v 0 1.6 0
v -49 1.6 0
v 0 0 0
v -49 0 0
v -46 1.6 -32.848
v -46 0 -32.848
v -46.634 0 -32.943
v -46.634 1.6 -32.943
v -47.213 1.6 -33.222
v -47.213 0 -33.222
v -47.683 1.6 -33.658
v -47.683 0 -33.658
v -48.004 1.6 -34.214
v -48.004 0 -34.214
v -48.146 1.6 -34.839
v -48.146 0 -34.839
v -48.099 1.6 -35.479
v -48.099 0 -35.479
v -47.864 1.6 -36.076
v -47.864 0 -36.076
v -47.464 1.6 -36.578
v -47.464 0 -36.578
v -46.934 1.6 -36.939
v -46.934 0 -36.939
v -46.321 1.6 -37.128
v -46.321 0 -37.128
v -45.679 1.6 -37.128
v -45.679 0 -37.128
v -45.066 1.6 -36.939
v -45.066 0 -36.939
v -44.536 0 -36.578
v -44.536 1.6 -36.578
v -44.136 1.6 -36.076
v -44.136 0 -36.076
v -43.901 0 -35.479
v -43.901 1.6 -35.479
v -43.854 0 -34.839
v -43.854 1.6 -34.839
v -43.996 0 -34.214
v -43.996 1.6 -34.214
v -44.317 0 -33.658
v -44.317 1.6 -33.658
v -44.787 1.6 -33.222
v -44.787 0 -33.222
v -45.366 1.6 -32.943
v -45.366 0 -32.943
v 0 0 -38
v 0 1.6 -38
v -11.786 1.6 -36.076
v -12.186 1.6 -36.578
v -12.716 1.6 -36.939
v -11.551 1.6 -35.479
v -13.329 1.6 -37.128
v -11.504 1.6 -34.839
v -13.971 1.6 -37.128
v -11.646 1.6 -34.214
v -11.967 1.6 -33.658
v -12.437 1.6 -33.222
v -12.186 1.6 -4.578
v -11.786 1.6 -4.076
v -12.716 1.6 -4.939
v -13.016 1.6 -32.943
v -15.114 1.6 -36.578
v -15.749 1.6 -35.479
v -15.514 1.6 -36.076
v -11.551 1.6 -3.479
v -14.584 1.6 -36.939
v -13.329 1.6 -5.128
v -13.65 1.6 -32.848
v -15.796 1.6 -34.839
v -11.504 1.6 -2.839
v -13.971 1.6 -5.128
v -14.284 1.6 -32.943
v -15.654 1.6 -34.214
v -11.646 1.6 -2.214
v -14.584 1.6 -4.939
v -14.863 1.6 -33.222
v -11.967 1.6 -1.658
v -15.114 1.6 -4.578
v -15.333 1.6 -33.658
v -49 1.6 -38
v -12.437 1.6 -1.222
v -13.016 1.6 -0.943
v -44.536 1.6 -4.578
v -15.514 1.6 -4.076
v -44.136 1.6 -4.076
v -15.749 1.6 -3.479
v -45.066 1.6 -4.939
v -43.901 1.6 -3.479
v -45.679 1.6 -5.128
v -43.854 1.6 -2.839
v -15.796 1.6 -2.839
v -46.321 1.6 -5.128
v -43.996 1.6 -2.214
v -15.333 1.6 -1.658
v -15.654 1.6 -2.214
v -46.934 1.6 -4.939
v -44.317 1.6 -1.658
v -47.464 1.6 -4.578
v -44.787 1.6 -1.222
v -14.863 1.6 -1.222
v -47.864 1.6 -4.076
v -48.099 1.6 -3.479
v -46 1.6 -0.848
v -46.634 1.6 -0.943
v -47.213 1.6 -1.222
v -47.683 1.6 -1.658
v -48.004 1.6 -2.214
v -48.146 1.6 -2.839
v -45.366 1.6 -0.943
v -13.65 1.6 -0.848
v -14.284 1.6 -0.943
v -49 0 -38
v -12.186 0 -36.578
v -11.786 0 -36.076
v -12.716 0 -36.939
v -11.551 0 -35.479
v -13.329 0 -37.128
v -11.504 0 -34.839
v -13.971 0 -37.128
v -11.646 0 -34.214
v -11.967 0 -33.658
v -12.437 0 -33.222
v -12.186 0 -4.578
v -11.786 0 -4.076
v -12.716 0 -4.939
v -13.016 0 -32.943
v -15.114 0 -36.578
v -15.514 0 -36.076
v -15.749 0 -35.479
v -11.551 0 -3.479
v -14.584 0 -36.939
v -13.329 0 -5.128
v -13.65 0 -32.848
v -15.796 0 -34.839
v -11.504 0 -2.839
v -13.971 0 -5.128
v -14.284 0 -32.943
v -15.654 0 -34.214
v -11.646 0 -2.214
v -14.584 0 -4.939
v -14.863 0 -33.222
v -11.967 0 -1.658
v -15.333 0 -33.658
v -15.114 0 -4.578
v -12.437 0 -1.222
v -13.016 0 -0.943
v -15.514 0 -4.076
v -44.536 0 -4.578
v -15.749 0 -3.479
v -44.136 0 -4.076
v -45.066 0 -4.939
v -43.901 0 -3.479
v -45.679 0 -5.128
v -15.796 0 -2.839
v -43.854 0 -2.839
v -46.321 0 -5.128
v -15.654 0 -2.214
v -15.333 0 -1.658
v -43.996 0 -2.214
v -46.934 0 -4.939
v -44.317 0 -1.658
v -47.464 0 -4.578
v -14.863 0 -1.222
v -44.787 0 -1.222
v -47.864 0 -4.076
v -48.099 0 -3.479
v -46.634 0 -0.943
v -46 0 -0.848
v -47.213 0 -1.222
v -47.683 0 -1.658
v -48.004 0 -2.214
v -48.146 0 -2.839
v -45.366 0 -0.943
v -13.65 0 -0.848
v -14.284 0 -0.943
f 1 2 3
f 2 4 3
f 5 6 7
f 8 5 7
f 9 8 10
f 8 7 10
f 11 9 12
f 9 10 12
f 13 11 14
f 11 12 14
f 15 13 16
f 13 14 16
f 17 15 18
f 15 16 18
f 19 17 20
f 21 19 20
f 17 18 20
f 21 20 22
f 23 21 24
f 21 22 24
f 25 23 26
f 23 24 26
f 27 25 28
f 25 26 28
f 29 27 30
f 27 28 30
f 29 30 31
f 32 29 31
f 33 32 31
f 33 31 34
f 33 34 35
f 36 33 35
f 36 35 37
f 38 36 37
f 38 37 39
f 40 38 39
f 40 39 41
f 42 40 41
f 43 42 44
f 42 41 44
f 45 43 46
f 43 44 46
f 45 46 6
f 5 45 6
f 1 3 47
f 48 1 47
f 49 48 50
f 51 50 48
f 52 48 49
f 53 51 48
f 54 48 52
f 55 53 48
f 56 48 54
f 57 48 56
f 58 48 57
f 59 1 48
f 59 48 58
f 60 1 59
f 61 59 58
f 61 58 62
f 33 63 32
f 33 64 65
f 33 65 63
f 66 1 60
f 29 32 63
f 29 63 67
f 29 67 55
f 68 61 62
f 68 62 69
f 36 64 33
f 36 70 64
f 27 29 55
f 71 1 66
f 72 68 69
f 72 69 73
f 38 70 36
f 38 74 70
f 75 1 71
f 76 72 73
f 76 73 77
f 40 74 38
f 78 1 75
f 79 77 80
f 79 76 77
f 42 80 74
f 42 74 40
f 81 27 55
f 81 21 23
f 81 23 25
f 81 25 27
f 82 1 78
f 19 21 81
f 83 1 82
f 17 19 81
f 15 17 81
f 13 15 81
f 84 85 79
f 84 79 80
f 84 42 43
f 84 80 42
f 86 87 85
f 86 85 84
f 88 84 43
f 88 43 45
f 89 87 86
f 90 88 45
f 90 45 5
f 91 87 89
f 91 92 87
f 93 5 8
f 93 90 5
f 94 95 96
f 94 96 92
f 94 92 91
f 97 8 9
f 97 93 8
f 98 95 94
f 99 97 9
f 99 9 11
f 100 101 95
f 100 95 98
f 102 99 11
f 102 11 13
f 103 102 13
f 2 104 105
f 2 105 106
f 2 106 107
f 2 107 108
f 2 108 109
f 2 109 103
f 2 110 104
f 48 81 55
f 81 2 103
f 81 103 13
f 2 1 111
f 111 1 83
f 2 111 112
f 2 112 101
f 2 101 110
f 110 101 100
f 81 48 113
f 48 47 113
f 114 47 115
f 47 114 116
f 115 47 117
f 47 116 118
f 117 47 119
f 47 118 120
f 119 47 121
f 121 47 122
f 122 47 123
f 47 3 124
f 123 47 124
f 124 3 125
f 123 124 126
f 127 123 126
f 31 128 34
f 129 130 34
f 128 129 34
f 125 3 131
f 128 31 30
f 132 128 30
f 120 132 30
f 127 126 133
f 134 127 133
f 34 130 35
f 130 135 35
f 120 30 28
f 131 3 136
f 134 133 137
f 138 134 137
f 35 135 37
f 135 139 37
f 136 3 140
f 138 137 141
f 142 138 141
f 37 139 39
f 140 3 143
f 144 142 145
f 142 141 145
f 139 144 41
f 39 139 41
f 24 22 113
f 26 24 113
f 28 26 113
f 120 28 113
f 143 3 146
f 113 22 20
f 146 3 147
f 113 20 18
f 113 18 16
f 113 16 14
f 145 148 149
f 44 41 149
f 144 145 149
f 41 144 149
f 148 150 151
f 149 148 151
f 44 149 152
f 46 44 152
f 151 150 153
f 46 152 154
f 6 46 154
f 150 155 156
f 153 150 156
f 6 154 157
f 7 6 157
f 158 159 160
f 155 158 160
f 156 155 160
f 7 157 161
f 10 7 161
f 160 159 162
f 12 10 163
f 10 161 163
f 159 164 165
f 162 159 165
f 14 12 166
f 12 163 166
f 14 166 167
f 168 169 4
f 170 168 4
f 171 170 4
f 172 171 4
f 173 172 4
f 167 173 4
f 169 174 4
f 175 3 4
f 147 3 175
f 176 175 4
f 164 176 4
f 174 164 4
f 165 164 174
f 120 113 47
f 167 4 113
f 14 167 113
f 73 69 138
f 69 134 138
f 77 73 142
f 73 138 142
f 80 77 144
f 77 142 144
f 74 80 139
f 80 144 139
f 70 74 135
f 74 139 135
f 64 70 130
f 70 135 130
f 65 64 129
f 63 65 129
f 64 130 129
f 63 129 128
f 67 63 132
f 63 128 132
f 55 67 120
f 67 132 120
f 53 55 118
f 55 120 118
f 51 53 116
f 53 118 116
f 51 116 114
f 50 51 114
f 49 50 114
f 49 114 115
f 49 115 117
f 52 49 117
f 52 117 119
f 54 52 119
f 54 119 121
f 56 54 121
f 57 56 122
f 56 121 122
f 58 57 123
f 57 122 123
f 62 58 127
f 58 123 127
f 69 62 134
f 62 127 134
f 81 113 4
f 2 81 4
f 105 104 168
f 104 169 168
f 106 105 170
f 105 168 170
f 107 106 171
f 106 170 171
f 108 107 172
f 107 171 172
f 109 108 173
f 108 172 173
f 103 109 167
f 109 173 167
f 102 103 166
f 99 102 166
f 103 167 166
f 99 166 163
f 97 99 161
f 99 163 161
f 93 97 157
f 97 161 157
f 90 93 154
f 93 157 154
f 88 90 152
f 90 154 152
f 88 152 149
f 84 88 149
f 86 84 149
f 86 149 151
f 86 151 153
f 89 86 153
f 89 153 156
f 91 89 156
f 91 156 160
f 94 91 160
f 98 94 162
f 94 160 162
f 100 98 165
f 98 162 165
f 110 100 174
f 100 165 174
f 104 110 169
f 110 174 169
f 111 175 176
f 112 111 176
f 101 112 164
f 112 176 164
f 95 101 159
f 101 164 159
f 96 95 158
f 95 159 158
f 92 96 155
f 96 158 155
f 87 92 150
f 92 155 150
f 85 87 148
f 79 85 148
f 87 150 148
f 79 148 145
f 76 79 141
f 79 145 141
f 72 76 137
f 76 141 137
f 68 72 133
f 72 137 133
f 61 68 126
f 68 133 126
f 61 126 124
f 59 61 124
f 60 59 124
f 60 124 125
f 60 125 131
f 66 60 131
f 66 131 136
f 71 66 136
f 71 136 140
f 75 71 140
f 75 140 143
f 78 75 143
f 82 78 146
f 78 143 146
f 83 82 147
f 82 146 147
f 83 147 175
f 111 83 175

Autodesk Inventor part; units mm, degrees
ref_plane "YZ Plane" through (0, 0, 0) normal (1, 0, 0) x (0, 1, 0)
ref_plane "XZ Plane" through (0, 0, 0) normal (0, 1, 0) x (-1, 0, 0)
ref_plane "XY Plane" through (0, 0, 0) normal (0, 0, 1) x (1, 0, 0)
sketch "Sketch1" plane through (0, 0, 0) normal (0, 1, 0) x (-1, 0, 0)
  line L0 (49, 0) -> (0, 0)
  line L1 (0, 0) -> (0, -38)
  line L2 (0, -38) -> (49, -38)
  line L3 (49, -38) -> (49, 0)
  dimension "d0" = 38
  dimension "d1" = 49
extrude "Extrusion1" add sketch "Sketch1" along normal blind 1.6
sketch "Sketch2" plane through (0, 1.6, 0) normal (0, 1, 0) x (1, 0, 0)
  line L0 (-49, 38) -> (-49, 0) construction
  line L1 (-49, 19) -> (0, 19) construction
  line L2 (0, 0) -> (0, 38) construction
  line L3 (0, 38) -> (-49, 38) projected
  point P0 (-13.65, 3)
  point P1 (-13.65, 35)
  point P2 (-46, 35)
  point P3 (-46, 3)
  dimension "d5" = 32.35
  dimension "d6" = 3
  dimension "d14" = 3
hole "Hole1" at (-13.65, 1.6, -3) at (-13.65, 1.6, -35) at (-46, 1.6, -35) at (-46, 1.6, -3) direction (0, -1, 0) diameter 4.305 end through all clearance for "Flat Head Machine Screw (82)" size "#6" standard "Ansi Unified Screw Threads"
properties part number "_Reference_PCB"
